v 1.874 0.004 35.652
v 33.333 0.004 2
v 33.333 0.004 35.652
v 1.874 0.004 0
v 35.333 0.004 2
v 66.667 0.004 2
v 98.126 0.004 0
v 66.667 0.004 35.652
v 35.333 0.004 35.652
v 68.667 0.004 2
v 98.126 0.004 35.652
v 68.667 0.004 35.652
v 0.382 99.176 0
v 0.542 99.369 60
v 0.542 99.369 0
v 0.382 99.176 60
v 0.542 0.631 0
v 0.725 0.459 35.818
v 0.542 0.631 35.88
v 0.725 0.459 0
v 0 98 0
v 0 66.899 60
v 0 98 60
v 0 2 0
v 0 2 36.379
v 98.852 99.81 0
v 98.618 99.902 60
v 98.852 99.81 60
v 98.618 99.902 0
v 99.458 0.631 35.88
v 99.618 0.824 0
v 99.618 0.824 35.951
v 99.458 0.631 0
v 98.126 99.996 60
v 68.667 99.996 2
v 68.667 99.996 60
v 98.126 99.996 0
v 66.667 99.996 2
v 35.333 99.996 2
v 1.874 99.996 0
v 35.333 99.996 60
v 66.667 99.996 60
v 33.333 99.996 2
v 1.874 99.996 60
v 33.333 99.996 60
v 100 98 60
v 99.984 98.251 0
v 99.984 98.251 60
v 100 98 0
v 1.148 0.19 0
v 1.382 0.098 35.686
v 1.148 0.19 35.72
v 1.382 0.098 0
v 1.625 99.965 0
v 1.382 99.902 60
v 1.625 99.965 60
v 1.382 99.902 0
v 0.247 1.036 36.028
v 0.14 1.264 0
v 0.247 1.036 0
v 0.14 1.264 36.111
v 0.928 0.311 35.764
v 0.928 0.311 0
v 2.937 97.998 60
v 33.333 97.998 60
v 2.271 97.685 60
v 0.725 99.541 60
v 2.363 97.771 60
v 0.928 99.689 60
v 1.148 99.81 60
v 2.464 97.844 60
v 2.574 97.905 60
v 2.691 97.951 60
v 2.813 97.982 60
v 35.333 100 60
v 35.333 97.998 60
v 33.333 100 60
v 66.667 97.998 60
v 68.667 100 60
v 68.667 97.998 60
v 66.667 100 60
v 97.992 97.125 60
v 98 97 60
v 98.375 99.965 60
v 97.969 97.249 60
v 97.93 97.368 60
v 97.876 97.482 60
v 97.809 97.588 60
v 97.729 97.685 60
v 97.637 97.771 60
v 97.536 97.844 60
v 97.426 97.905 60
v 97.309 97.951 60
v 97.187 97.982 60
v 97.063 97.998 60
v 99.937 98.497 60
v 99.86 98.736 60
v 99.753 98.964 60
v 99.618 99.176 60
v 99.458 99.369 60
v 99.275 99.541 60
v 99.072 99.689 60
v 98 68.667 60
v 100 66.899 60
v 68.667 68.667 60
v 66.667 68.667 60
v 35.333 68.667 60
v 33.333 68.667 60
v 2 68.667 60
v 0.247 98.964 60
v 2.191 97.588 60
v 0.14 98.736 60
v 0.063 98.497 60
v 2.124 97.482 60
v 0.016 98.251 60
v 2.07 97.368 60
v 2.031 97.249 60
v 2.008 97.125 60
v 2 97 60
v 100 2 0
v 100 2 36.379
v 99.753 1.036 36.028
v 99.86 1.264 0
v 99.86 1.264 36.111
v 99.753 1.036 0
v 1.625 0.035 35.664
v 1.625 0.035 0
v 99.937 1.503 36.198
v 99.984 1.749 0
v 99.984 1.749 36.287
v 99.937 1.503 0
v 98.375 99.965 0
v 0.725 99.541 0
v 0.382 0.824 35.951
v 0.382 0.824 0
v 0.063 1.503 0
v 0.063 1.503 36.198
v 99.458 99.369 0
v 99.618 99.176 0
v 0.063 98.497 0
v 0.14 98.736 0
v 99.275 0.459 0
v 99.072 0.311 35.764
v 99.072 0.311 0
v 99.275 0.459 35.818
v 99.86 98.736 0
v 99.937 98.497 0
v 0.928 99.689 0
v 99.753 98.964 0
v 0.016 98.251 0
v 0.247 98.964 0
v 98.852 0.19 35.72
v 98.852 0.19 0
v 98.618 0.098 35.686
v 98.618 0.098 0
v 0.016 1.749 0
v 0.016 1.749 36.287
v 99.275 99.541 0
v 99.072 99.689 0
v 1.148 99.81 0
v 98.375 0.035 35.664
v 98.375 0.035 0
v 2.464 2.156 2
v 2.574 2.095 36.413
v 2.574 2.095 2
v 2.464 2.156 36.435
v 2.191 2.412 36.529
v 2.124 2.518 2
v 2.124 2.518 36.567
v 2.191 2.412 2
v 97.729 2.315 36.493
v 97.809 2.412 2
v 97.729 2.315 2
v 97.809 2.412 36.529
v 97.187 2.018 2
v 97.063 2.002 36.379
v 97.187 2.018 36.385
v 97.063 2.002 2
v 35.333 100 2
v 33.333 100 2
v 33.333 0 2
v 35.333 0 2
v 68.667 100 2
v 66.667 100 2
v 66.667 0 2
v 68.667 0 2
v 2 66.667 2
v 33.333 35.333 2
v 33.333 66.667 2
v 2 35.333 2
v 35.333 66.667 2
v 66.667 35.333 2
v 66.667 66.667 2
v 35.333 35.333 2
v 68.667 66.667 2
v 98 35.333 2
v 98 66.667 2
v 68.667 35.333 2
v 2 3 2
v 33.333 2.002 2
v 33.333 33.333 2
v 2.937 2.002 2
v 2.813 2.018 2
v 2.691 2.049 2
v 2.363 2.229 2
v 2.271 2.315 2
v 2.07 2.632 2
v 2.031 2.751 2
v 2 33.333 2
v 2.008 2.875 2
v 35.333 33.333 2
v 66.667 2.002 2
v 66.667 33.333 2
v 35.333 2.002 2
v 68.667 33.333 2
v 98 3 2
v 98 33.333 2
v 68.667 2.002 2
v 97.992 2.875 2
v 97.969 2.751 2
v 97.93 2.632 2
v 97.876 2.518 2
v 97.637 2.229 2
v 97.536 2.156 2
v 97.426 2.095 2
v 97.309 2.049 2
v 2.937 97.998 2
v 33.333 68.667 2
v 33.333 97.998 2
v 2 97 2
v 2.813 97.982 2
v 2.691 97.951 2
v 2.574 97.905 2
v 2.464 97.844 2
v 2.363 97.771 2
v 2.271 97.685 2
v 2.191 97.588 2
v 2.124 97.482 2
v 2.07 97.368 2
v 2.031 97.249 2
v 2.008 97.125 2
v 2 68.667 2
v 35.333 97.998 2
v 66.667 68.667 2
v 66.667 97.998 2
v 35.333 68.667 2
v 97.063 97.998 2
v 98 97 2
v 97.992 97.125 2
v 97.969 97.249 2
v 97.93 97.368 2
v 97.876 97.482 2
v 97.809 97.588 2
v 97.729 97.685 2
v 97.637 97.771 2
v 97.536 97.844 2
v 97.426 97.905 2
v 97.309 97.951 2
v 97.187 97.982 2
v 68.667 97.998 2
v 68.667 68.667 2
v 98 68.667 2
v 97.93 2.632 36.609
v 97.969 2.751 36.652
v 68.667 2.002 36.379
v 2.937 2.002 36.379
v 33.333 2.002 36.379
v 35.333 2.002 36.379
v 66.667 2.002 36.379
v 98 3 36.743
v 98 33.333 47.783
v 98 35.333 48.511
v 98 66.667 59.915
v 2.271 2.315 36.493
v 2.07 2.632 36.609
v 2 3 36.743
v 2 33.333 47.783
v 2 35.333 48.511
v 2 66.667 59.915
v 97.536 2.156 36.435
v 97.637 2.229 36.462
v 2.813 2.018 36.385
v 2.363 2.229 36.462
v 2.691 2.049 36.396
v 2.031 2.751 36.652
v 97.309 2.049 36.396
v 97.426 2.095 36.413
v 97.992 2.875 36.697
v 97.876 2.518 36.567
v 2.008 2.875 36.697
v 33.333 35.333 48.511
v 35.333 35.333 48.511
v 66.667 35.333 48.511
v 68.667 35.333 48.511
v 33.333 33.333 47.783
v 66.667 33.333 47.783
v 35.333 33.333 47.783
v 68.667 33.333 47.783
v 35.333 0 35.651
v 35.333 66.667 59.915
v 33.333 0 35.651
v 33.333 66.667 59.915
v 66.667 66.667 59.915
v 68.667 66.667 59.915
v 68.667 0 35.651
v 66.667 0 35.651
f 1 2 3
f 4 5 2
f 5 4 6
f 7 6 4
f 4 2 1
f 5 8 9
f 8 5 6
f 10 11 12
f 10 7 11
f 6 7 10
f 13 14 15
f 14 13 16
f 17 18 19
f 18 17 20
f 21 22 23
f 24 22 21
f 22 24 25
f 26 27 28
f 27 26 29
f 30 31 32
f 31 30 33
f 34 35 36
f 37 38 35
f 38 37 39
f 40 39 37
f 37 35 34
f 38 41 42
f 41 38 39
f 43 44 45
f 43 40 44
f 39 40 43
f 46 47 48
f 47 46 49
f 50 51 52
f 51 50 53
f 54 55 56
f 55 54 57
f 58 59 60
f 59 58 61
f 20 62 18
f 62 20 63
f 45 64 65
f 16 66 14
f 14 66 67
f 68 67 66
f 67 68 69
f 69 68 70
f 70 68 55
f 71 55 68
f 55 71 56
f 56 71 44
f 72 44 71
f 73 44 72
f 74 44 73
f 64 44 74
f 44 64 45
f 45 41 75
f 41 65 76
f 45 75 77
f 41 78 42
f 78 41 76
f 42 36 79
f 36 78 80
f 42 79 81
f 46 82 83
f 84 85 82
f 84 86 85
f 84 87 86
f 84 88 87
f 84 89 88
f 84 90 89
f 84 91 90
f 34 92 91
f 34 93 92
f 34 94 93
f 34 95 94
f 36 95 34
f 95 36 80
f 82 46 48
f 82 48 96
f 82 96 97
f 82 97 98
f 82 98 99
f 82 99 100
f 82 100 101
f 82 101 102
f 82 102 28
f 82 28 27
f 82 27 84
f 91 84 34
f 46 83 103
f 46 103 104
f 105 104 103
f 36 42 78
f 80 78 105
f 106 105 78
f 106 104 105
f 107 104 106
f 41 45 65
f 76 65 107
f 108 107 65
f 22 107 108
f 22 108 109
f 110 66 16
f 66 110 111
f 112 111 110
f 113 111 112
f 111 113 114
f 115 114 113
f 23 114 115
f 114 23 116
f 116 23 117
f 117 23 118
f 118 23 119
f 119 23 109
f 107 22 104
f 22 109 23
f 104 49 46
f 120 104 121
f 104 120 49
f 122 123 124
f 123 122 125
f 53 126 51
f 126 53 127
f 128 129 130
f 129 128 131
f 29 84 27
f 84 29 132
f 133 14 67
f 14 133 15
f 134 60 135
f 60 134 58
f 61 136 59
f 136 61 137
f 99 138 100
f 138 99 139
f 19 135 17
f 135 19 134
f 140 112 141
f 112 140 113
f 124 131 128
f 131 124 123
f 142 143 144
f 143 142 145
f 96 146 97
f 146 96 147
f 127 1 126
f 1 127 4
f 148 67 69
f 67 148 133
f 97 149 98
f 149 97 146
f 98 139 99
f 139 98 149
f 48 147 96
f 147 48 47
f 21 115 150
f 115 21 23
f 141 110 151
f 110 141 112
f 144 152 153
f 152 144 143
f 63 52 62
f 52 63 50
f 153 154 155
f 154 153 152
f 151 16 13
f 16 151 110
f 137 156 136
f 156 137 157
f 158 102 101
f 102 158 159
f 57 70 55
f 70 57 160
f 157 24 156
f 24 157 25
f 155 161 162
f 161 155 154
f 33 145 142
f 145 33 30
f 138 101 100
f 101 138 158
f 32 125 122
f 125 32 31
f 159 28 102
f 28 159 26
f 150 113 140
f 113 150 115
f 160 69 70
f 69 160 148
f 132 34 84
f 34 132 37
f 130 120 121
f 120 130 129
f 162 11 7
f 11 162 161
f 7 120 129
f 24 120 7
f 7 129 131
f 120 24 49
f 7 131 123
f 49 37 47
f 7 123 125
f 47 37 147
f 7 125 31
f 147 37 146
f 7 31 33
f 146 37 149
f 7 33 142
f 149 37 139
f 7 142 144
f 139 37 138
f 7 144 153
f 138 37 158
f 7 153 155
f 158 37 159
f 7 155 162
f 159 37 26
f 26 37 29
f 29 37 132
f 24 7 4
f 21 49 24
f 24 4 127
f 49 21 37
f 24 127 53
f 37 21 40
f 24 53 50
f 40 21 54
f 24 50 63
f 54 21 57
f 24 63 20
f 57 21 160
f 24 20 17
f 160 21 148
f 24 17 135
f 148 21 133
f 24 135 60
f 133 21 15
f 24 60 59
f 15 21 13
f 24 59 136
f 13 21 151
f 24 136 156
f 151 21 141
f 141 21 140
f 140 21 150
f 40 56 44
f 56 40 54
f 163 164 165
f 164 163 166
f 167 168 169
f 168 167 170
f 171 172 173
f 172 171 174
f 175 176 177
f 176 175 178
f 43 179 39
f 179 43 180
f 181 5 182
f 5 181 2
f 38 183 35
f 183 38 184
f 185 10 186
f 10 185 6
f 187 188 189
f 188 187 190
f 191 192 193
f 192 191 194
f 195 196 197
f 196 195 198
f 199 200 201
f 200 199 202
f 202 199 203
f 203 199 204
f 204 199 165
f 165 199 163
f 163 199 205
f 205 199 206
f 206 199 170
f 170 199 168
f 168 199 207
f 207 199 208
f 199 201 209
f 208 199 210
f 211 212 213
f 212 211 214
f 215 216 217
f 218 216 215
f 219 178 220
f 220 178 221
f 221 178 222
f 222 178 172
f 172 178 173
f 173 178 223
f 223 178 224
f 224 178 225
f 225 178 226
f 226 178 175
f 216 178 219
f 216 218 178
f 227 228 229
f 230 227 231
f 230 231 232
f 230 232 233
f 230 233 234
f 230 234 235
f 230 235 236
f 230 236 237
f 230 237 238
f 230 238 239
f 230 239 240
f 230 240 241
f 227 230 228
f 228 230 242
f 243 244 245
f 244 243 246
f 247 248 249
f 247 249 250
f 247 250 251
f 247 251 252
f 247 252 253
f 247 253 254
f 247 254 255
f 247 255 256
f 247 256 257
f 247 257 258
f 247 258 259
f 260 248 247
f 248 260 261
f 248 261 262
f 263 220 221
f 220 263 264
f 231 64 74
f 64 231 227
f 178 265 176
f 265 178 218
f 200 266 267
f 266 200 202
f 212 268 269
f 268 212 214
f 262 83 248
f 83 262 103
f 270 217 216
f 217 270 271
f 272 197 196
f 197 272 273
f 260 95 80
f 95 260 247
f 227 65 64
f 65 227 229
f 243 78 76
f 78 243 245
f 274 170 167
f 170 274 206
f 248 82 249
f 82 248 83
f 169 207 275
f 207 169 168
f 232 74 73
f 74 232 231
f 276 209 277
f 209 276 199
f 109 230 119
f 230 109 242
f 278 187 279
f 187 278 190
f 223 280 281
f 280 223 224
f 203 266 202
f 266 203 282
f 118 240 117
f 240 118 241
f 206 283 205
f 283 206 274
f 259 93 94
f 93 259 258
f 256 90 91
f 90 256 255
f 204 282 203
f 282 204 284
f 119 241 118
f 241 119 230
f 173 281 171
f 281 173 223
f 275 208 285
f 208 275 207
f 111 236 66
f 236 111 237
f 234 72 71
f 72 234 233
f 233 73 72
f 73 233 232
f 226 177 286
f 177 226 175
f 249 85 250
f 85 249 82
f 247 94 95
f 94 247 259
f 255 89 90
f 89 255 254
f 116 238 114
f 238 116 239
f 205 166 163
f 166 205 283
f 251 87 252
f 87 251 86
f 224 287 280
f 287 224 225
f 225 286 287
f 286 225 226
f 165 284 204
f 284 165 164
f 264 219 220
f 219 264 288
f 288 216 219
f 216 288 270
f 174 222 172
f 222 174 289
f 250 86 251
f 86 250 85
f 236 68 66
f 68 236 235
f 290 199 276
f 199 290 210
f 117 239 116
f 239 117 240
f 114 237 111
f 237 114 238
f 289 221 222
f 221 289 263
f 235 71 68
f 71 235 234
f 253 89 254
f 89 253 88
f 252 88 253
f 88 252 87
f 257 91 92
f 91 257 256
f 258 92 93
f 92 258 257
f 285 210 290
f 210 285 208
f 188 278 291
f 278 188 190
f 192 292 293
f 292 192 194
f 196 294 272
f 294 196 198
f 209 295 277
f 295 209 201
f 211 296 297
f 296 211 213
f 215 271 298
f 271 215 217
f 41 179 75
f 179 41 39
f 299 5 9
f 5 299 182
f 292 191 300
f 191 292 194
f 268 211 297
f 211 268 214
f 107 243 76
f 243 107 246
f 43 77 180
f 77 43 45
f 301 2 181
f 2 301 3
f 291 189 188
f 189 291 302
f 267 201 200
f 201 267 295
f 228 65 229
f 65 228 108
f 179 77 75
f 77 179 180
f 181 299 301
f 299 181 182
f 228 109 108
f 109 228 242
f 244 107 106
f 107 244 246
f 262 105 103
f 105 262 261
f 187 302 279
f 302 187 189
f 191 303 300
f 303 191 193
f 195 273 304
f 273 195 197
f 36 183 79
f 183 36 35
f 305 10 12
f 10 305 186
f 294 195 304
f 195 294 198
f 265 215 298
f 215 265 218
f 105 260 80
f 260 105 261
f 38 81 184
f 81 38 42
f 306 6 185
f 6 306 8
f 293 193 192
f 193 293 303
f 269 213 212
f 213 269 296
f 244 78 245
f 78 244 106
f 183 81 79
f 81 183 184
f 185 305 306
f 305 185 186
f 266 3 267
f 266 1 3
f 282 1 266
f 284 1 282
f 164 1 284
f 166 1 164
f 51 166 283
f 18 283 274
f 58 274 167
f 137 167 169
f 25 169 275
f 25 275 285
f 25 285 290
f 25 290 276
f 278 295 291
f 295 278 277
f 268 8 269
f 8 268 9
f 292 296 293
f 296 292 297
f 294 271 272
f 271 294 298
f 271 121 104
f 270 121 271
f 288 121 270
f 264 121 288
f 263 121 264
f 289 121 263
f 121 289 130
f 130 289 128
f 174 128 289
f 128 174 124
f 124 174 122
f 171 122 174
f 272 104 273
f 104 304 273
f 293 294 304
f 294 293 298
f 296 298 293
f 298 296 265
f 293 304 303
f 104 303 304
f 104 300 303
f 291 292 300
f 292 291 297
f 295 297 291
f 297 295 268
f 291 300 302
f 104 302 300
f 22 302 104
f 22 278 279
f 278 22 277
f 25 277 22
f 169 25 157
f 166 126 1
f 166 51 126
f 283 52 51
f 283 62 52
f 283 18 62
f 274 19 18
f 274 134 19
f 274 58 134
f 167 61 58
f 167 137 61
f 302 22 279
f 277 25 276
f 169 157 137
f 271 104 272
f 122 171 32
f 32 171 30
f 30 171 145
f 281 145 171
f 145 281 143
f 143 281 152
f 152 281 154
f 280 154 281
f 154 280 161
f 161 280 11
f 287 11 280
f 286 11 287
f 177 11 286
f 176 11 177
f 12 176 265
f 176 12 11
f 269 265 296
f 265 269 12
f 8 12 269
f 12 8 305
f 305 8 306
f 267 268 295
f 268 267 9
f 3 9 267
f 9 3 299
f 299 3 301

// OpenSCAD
$fn = 50;
xlength = 100;
ywidth = 100;
zheight = 60;
corner = 2; // radius
wall = 2; // thickness
divisions = 3;
fudge = 43;
angle = 20;

difference()
{
    base();
    
    // trianglular cutout 
    translate([-xlength/2,-fudge,zheight/3]) rotate([angle,0,0]) cube([xlength*2, ywidth*2, zheight*2]);
}

module base()
{
    // hollow box with rounded corners
    difference()
    {
        roundedBox(xlength, ywidth, zheight, corner);
        translate([wall,wall,wall]) roundedBox(xlength-2*wall, ywidth-2*wall, zheight, corner/2);
    }

    // dividers
    for(i = [1 : 1 : divisions-1])
    {
        translate([0,ywidth/divisions*i,wall]) cube([xlength,wall,zheight-wall]);
        translate([xlength/divisions*i,0,wall]) cube([wall,ywidth,zheight-wall]);
    }
}

module roundedBox(xdim, ydim, zdim, rdim)
{
    hull()
    {
        translate([rdim,rdim,0]) cylinder(h=zdim,r=rdim);
        translate([xdim-rdim,rdim,0]) cylinder(h=zdim,r=rdim);
        translate([rdim,ydim-rdim,0]) cylinder(h=zdim,r=rdim);
        translate([xdim-rdim,ydim-rdim,0]) cylinder(h=zdim,r=rdim);
    }
}
